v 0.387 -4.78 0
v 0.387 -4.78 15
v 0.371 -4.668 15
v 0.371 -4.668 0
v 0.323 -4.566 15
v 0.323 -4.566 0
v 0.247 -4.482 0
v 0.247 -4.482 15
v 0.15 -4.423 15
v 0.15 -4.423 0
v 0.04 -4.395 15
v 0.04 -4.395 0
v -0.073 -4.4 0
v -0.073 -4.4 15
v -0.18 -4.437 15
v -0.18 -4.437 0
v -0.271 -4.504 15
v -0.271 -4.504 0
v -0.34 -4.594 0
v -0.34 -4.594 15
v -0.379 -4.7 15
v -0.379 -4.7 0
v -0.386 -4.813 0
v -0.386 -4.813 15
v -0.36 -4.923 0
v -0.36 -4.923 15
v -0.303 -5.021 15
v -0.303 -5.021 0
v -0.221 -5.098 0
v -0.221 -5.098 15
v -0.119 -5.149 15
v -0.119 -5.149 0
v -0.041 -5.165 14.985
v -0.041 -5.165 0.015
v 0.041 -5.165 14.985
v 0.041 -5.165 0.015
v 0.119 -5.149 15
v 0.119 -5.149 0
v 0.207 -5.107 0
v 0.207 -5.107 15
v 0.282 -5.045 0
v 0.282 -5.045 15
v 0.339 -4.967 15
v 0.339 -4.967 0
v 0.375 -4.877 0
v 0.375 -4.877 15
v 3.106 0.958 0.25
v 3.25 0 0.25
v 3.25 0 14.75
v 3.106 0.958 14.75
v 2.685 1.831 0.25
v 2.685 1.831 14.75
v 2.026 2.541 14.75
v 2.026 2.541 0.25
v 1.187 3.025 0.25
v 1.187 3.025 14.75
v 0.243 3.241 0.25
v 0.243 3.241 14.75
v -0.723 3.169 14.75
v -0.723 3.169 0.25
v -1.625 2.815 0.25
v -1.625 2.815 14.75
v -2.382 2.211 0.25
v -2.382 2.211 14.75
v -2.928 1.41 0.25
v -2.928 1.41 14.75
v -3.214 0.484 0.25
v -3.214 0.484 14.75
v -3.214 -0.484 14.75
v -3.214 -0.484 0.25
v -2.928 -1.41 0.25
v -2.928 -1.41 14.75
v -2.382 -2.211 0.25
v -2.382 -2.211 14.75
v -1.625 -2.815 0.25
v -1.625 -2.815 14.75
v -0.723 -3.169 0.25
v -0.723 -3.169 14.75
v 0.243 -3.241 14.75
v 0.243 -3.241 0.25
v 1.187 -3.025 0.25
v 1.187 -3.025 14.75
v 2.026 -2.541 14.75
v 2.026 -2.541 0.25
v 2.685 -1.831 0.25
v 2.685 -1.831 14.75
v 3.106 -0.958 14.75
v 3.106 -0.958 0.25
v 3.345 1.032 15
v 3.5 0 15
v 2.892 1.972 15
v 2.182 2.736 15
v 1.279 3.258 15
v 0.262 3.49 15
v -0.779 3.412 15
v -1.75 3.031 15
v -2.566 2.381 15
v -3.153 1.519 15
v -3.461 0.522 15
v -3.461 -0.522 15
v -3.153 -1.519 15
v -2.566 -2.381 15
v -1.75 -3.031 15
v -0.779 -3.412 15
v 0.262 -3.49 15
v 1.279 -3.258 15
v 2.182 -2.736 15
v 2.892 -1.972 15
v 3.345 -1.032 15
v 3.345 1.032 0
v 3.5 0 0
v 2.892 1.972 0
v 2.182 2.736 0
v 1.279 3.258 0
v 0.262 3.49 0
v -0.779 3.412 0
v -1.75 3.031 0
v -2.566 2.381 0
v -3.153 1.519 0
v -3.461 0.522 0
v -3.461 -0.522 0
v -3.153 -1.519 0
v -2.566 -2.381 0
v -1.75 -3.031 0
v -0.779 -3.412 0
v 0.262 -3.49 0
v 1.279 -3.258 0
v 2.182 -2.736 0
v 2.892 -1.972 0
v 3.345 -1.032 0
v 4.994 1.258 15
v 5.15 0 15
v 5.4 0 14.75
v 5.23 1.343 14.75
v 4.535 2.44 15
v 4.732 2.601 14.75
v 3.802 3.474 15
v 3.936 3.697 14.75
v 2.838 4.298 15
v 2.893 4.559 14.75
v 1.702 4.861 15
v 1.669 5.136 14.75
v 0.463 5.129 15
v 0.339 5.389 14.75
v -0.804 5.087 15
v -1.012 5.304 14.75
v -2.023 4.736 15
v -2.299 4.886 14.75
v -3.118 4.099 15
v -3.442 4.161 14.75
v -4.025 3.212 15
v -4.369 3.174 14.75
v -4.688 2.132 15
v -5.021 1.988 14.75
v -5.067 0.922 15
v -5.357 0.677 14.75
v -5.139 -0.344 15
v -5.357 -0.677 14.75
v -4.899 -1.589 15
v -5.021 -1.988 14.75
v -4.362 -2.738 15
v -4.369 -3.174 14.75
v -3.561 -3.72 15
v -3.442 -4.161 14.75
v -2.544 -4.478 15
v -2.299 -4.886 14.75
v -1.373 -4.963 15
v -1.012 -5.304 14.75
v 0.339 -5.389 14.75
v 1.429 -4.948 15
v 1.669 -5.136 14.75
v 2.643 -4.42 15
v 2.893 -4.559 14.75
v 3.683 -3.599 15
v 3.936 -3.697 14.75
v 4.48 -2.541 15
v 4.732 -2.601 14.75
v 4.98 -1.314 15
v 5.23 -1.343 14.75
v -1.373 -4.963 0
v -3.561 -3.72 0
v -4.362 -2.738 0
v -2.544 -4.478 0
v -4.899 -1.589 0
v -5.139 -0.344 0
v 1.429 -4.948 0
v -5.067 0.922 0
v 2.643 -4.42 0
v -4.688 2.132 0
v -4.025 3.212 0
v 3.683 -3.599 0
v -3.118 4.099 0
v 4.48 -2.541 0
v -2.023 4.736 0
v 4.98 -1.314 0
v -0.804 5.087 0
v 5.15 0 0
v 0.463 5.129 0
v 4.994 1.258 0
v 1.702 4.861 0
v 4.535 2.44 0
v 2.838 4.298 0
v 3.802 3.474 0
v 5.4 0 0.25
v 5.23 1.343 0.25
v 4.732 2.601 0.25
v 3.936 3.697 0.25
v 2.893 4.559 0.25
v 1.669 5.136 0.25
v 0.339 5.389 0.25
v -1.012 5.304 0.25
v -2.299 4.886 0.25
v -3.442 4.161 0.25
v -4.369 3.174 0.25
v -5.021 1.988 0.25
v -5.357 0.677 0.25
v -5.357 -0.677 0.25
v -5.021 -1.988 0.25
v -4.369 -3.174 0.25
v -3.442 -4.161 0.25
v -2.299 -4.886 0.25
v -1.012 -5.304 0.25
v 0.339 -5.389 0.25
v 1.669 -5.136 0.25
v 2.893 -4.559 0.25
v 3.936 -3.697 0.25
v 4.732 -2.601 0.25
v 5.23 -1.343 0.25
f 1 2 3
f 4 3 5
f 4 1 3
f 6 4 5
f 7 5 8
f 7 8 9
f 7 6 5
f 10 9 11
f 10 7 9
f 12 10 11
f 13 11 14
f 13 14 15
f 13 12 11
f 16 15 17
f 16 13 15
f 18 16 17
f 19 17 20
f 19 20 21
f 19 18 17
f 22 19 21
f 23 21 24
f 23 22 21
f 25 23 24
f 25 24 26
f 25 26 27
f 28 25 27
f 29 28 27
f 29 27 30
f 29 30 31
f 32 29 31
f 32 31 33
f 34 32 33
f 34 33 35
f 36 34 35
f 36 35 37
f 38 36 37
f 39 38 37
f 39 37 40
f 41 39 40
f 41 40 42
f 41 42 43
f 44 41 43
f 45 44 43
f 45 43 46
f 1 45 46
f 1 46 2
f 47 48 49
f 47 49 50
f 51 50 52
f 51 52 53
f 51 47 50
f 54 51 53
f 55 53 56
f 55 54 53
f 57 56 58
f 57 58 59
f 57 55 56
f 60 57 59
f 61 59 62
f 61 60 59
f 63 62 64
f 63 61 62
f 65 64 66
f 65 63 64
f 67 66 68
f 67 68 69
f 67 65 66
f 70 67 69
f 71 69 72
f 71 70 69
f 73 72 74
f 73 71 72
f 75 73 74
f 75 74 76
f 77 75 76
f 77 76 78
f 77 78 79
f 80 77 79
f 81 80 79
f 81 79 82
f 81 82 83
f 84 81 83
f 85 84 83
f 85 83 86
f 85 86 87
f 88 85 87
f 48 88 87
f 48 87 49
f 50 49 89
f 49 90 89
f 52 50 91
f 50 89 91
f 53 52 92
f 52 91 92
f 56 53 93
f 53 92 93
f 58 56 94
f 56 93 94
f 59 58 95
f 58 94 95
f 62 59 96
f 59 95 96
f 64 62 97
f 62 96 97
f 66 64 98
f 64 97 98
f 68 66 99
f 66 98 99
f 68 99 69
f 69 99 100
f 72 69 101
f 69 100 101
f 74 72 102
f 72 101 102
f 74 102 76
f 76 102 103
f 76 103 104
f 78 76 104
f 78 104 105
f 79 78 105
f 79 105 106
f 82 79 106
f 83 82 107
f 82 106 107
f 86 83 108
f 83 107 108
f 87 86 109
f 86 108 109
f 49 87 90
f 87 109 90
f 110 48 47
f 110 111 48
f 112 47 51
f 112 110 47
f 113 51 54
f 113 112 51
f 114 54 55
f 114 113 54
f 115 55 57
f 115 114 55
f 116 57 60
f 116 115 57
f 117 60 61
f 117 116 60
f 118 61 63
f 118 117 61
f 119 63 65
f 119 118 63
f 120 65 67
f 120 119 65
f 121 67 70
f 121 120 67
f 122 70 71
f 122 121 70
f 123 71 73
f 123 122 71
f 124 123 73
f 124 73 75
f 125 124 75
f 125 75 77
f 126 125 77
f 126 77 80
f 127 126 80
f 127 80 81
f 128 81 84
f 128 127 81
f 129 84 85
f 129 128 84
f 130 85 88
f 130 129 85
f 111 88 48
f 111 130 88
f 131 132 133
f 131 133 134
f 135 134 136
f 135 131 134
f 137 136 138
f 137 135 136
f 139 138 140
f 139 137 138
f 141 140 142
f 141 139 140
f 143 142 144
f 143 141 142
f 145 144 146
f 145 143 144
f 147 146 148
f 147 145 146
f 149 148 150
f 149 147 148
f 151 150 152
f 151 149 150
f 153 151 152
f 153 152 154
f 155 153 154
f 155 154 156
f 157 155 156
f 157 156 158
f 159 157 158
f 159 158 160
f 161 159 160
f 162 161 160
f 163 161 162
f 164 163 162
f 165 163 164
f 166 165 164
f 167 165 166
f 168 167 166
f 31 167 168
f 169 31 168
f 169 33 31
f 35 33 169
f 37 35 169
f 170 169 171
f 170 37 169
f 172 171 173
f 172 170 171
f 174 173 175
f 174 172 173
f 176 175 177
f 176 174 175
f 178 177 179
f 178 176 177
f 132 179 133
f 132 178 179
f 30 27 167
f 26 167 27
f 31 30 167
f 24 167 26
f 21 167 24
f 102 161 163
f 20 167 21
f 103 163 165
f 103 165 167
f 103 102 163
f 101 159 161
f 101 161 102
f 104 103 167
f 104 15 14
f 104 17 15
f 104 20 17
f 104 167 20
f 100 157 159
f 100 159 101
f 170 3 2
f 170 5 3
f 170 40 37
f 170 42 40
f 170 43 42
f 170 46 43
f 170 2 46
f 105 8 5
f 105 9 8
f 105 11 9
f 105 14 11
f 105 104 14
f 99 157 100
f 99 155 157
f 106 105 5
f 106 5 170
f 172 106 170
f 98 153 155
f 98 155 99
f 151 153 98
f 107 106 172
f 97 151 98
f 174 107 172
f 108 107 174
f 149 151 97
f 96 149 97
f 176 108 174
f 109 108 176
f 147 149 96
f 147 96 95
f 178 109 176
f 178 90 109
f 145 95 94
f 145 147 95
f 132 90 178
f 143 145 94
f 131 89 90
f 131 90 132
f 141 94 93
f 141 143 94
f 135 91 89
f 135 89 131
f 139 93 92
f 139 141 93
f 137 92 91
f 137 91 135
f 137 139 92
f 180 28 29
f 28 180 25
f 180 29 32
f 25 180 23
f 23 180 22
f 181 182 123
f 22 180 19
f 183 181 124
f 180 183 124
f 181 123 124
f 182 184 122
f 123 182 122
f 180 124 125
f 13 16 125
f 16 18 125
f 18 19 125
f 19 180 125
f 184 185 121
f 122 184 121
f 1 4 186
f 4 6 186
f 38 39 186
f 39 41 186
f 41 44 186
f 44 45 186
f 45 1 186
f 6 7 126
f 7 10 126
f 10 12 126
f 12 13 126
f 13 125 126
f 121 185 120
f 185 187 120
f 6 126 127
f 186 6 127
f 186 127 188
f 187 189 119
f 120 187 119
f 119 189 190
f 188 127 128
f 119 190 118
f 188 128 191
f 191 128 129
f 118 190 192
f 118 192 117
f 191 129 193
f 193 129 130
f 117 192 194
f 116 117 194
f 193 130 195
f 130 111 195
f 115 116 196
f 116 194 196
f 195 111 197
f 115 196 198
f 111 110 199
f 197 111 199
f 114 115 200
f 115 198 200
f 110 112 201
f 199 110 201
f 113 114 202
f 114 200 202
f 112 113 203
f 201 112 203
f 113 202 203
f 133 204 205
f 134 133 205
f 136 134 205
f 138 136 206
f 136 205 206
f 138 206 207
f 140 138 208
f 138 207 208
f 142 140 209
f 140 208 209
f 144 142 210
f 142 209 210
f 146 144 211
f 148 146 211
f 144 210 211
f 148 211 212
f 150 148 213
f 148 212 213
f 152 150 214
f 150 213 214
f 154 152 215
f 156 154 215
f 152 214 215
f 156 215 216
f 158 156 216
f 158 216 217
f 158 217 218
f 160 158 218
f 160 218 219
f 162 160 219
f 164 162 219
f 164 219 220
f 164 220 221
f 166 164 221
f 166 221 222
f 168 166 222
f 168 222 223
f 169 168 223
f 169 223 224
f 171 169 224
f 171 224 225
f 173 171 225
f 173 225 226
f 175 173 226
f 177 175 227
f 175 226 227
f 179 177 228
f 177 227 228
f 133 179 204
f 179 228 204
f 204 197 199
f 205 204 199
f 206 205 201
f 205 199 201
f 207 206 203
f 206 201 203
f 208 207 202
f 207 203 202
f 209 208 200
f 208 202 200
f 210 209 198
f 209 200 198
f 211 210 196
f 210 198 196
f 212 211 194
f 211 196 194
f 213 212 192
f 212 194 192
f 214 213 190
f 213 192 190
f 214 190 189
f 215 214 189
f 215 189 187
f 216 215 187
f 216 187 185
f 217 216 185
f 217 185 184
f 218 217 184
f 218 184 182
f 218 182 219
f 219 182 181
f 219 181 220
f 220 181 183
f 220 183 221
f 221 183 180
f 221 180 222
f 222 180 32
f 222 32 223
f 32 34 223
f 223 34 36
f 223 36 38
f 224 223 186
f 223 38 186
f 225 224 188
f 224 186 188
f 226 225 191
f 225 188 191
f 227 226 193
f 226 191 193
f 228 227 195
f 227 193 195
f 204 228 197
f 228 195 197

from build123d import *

# Parameters (mm, degrees)
F0_R     = 5.4
F0_R_2   = 0.3873329086
F0_R_3   = 3.25
F1_DEPTH = 15


# Not quite as in the source:
# - a fillet or chamfer that OpenCascade refuses, or shapes differently, is made with other operations: its cross-section is extruded or revolved along the edge and cut away or added


with BuildPart() as f1:
    # F0 (on Top) → F1 (new body)
    with BuildSketch(Plane.XY):
        Circle(F0_R)
        with Locations((0, -4.7800762477)):
            Circle(F0_R_2, mode=Mode.SUBTRACT)
        Circle(F0_R_3, mode=Mode.SUBTRACT)
    extrude(amount=F1_DEPTH)

    # F2: chamfer of 0.25 on 3 edges, made by hand

    # F2_s1 → F2_t2 (revolve, cut)
    with BuildSketch(Plane.XZ):
        Polygon((3.25, 14.75), (3.5, 15), (3.25, 15), align=None)
    revolve(axis=Axis((0, 0, 15), (0, 0, 1)), mode=Mode.SUBTRACT)

    # F2_s3 → F2_t4 (revolve, cut)
    with BuildSketch(Plane.XZ):
        Polygon((5.4, 14.75), (5.15, 15), (5.4, 15), align=None)
    revolve(axis=Axis((0, 0, 15), (0, 0, 1)), mode=Mode.SUBTRACT)

    # F2_s5 → F2_t6 (revolve, cut)
    with BuildSketch(Plane.XZ):
        Polygon((3.25, 0.25), (3.5, 0), (3.25, 0), align=None)
    revolve(axis=Axis((0, 0, 0), (0, 0, 1)), mode=Mode.SUBTRACT)

    # F3: chamfer of 0.25 on 1 edges, made by hand

    # F3_s1 → F3_t2 (revolve, cut)
    with BuildSketch(Plane.XZ):
        Polygon((5.4, 0.25), (5.15, 0), (5.4, 0), align=None)
    revolve(axis=Axis((0, 0, 0), (0, 0, 1)), mode=Mode.SUBTRACT)


solid = f1.part
